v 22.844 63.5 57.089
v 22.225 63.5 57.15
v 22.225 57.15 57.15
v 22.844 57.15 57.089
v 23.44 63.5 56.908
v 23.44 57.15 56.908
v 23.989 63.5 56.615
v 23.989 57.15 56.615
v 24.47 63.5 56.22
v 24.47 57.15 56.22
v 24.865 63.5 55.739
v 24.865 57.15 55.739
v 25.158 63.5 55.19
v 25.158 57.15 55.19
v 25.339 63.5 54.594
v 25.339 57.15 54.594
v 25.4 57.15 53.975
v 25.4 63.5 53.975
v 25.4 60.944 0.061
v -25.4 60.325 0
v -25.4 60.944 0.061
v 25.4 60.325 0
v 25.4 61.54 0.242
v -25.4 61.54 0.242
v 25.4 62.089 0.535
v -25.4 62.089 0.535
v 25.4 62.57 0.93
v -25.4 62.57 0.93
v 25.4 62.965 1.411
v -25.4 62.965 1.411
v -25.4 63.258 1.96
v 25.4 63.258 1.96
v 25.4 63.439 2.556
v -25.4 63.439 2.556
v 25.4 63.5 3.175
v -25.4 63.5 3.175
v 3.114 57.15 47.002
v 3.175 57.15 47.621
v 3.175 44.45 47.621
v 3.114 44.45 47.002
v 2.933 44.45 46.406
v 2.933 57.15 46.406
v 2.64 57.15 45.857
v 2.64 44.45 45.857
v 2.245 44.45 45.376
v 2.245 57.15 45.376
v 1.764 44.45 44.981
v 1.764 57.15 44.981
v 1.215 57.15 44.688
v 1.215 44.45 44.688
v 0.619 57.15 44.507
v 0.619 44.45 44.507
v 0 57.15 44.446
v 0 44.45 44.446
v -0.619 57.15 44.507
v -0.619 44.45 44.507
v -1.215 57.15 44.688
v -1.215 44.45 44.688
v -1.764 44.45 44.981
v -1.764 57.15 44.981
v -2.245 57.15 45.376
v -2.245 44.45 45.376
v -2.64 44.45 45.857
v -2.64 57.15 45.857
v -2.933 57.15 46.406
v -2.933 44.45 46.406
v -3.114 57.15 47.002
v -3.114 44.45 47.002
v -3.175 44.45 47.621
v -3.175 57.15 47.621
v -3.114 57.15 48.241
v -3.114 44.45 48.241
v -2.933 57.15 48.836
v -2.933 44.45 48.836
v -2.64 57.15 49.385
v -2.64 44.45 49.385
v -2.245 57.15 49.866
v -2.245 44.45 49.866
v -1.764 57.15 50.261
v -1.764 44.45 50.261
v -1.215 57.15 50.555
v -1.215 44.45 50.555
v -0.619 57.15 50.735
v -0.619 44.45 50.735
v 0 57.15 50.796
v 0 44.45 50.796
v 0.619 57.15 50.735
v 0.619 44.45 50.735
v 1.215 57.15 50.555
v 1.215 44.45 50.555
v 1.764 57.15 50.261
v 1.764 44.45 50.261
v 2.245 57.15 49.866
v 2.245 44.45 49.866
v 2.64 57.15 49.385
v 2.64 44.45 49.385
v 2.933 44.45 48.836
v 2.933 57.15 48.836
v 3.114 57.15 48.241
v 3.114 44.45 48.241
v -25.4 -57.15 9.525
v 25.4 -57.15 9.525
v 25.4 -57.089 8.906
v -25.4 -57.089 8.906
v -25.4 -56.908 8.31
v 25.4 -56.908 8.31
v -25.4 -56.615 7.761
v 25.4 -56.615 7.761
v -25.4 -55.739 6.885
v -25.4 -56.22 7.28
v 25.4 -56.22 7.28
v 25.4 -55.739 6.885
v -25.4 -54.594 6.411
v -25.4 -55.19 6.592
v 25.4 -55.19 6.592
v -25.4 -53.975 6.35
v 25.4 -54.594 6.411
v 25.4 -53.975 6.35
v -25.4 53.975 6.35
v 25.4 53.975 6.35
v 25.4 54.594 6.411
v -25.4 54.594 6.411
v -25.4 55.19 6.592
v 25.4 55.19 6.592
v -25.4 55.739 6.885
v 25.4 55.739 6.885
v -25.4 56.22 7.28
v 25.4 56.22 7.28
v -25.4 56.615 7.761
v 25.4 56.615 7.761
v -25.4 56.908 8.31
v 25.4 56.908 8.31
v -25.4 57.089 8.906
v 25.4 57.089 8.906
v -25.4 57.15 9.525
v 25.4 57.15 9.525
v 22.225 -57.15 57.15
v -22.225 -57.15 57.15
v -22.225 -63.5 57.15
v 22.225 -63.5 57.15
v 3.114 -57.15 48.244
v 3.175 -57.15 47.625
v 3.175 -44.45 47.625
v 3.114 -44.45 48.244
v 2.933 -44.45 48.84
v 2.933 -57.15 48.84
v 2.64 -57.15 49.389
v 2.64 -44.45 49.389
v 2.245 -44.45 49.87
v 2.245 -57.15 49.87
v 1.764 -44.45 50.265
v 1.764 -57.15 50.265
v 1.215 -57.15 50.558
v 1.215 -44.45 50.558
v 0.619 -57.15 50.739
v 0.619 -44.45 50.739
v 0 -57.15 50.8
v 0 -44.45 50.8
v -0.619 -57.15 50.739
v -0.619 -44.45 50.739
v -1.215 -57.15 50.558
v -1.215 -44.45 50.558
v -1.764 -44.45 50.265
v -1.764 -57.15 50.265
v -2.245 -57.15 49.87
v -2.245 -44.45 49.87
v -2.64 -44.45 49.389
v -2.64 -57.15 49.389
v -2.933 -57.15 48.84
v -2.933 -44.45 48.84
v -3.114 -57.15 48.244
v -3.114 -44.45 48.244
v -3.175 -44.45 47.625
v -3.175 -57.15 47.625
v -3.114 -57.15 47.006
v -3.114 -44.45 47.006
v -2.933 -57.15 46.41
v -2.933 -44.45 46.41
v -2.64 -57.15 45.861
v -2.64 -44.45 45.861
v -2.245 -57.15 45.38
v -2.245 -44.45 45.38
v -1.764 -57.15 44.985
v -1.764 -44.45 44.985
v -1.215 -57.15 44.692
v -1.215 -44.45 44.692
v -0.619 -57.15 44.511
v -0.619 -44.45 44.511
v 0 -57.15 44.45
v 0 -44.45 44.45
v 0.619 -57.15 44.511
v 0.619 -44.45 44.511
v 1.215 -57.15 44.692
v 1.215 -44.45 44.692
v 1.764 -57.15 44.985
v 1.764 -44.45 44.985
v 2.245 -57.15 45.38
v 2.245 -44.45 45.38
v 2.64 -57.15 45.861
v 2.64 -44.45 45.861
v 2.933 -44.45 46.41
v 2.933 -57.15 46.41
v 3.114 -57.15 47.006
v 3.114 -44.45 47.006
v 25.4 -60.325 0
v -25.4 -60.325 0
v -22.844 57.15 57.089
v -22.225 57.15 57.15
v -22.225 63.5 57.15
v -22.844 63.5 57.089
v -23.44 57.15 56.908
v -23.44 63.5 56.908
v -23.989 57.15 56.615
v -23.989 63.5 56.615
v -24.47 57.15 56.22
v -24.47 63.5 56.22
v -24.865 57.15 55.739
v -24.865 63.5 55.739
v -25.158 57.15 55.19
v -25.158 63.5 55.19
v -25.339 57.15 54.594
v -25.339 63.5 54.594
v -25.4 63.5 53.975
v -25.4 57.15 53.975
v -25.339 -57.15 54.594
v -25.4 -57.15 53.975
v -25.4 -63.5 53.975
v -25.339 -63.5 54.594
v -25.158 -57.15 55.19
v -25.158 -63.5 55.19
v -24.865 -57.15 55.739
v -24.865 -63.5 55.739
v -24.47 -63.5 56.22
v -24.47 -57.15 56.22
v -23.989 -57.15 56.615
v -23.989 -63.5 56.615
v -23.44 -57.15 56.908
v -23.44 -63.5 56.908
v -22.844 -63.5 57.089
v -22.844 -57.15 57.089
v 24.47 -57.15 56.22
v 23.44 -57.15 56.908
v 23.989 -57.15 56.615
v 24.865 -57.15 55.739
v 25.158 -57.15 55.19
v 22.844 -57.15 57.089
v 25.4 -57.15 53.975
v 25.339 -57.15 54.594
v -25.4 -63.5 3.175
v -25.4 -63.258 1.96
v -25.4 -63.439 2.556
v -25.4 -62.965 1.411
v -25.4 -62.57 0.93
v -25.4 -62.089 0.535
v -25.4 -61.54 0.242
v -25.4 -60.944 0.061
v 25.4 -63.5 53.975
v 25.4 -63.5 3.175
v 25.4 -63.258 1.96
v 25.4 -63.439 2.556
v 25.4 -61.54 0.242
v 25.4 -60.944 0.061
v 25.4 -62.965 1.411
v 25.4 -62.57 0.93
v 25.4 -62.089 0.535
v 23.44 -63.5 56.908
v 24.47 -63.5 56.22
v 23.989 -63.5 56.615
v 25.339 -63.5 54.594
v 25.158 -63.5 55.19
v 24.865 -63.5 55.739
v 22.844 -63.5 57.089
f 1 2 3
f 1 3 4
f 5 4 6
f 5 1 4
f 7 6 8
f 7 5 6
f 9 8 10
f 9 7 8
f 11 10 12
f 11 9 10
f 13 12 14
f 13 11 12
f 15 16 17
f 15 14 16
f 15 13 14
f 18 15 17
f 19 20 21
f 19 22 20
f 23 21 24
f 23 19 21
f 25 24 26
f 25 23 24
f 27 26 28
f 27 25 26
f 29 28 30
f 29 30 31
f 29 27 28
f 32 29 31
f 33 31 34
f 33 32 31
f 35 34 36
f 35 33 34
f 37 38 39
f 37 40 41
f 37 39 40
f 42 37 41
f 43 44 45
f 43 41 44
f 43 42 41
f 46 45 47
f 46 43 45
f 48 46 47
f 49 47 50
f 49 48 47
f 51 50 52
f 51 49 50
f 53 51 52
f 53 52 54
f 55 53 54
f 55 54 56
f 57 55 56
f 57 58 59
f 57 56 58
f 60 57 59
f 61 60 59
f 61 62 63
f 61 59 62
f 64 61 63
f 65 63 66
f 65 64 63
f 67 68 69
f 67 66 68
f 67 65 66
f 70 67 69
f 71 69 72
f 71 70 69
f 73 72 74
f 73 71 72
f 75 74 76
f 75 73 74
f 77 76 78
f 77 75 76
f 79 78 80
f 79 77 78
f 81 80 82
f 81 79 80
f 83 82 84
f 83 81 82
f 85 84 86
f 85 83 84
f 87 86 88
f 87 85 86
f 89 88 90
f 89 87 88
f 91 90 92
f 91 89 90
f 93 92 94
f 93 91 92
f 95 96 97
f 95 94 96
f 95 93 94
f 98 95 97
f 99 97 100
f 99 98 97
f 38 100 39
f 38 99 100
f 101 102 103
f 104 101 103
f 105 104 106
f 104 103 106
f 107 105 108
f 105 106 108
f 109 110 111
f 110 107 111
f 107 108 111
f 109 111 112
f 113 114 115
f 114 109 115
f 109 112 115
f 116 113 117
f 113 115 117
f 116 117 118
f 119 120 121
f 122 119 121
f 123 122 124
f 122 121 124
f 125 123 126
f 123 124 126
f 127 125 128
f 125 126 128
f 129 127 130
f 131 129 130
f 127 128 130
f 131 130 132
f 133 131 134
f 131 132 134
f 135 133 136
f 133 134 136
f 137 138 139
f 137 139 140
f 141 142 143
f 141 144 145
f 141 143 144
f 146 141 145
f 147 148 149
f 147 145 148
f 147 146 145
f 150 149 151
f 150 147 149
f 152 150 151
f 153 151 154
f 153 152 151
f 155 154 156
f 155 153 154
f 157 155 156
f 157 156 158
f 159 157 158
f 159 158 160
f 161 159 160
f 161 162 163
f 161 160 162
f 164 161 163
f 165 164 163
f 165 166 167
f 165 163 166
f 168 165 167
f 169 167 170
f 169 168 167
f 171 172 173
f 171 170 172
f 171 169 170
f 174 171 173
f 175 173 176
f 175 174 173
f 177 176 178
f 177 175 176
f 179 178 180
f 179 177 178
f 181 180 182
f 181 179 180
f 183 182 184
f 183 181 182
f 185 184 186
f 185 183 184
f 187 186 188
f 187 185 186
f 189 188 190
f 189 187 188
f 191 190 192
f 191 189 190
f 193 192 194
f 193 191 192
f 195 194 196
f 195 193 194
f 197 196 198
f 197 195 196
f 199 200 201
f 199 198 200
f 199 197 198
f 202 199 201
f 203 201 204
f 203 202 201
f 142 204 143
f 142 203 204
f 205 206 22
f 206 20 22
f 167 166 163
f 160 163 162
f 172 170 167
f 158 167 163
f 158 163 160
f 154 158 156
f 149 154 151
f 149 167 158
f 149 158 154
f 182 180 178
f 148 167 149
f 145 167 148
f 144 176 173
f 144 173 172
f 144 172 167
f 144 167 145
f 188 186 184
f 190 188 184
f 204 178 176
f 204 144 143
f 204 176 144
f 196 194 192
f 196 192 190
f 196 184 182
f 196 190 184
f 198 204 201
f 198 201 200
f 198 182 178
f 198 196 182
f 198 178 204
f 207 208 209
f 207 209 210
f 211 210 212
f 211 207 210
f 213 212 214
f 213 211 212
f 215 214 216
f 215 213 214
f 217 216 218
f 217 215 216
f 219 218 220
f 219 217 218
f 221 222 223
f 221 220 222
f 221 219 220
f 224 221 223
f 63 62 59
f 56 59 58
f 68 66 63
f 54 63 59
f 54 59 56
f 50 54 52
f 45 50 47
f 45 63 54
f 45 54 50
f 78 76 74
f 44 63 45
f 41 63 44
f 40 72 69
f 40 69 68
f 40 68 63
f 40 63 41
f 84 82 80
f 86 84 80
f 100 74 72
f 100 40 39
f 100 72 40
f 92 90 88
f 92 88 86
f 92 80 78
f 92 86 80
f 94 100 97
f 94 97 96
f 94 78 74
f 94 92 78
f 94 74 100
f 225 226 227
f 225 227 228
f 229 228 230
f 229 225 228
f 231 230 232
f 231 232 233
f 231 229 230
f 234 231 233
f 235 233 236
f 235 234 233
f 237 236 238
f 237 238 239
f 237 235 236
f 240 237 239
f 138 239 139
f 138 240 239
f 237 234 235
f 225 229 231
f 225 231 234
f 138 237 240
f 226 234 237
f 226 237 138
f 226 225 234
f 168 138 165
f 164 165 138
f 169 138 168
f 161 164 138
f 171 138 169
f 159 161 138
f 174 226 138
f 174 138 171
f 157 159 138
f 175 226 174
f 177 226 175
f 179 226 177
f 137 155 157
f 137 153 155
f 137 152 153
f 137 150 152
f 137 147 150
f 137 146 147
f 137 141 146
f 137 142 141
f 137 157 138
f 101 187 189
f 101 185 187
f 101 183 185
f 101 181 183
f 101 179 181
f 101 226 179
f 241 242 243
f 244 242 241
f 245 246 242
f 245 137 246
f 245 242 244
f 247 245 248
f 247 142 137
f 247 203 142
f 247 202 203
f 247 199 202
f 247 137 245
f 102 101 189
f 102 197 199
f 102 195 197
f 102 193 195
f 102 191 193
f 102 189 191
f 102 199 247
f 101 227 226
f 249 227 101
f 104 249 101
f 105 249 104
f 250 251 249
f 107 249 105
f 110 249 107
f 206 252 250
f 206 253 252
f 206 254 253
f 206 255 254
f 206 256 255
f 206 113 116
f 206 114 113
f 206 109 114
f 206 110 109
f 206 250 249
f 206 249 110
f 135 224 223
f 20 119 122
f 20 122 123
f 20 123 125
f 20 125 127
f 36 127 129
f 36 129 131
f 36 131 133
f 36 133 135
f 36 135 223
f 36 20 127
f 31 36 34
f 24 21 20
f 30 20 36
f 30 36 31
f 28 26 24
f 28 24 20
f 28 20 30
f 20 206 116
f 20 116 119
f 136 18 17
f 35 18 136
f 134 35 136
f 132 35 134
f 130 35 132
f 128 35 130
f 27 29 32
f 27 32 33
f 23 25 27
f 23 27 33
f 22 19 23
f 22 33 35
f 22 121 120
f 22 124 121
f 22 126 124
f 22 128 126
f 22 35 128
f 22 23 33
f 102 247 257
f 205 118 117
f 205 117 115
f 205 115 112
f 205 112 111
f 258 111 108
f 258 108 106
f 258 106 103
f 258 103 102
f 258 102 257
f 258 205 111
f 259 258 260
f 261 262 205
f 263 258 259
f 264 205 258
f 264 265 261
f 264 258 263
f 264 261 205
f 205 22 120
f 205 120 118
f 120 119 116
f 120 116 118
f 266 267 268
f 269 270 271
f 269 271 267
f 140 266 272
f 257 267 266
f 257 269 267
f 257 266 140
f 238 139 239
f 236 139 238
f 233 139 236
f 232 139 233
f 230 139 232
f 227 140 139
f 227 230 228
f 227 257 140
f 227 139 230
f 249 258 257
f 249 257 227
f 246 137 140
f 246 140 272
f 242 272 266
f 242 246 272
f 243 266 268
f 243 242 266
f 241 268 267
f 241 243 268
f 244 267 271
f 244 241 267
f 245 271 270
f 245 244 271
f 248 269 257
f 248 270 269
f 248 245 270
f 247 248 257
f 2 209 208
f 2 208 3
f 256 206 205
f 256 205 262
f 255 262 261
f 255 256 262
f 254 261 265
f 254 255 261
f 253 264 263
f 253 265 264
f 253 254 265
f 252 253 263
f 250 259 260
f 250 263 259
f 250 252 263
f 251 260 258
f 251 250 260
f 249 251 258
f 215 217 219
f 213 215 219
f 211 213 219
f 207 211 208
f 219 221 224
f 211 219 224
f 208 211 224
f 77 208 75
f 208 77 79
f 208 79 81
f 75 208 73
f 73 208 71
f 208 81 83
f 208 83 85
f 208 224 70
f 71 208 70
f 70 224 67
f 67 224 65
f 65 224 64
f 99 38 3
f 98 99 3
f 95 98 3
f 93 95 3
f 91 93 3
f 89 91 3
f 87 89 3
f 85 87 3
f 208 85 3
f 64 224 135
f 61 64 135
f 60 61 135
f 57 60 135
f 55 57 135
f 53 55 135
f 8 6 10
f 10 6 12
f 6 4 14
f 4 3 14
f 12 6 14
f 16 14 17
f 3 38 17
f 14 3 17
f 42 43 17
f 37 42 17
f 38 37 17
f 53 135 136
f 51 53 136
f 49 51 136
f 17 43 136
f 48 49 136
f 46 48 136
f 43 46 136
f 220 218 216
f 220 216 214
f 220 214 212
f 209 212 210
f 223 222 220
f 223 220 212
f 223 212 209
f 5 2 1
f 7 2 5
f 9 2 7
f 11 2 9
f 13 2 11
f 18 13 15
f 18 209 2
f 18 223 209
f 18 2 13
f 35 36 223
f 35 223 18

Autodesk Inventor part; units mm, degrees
ref_plane "YZ Plane" through (0, 0, 0) normal (1, 0, 0) x (0, 1, 0)
ref_plane "XZ Plane" through (0, 0, 0) normal (0, 1, 0) x (-1, 0, 0)
ref_plane "XY Plane" through (0, 0, 0) normal (0, 0, 1) x (1, 0, 0)
sketch "Sketch1" plane through (0, 0, 0) normal (0, 0, 1) x (1, 0, 0)
  line L0 (25.4, -63.5) -> (-25.4, -63.5)
  line L1 (-25.4, -63.5) -> (-25.4, 63.5)
  line L2 (-25.4, 63.5) -> (25.4, 63.5)
  line L3 (25.4, 63.5) -> (25.4, -63.5)
  point P0 (0, 0)
  dimension "d0" = 50.8
  dimension "d1" = 127
  dimension "d2" = 63.5
  dimension "d3" = 25.4
extrude "Extrusion1" add sketch "Sketch1" along normal blind 6.35
sketch "Sketch2" plane through (0, 0, 6.35) normal (0, 0, 1) x (1, 0, 0)
  line L0 (25.4, -63.5) -> (25.4, 63.5) projected
  line L1 (25.4, 63.5) -> (-25.4, 63.5)
  line L2 (-25.4, 63.5) -> (-25.4, 57.15)
  line L3 (-25.4, 57.15) -> (25.4, 57.15)
  line L4 (25.4, 57.15) -> (25.4, 63.5)
  line L5 (25.4, -63.5) -> (-25.4, -63.5)
  line L6 (-25.4, -63.5) -> (-25.4, -57.15)
  line L7 (-25.4, -57.15) -> (25.4, -57.15)
  line L8 (25.4, -57.15) -> (25.4, -63.5)
  point P0 (0, 0)
  dimension "d6" = 50.8
  dimension "d7" = 6.35
  dimension "d8" = 50.8
  dimension "d9" = 6.35
extrude "Extrusion2" add sketch "Sketch2" along normal blind 50.8
fillet "Fillet1" radius 3.175 8 edges at (-25.4, 60.325, 57.15) (25.4, 60.325, 57.15) (-25.4, -60.325, 57.15) (25.4, -60.325, 57.15) (0, -63.5, 0) (0, 63.5, 0) (0, 57.15, 6.35) (0, -57.15, 6.35)
sketch "Sketch3" plane through (-25.4, 57.15, 9.525) normal (0, -1, 0) x (1, 0, 0)
  circle A0 centre (25.4, 38.0964) radius 3.175
  line L0 (0, -6.35) -> (0, 44.45) projected
  line L1 (0, -0.0036) -> (75.5058, -0.0036) construction
  point P0 (25.4, -9.525)
  dimension "d13" = 6.35
  dimension "d14" = 25.4
  dimension "d15" = 38.1
extrude "Extrusion3" add sketch "Sketch3" along normal blind 12.7
sketch "Sketch4" plane through (-25.4, -57.15, 9.525) normal (0, 1, 0) x (1, 0, 0)
  circle A0 centre (25.4, -38.1) radius 3.175
  line L0 (0, 0) -> (100.0722, 0) construction
  line L1 (0, 6.35) -> (0, -44.45) construction
  point P0 (25.4, 9.525)
  dimension "d18" = 6.35
  dimension "d19" = 38.1
  dimension "d20" = 25.4
extrude "Extrusion4" add sketch "Sketch4" along normal blind 12.7
properties part number "Bracket3"
